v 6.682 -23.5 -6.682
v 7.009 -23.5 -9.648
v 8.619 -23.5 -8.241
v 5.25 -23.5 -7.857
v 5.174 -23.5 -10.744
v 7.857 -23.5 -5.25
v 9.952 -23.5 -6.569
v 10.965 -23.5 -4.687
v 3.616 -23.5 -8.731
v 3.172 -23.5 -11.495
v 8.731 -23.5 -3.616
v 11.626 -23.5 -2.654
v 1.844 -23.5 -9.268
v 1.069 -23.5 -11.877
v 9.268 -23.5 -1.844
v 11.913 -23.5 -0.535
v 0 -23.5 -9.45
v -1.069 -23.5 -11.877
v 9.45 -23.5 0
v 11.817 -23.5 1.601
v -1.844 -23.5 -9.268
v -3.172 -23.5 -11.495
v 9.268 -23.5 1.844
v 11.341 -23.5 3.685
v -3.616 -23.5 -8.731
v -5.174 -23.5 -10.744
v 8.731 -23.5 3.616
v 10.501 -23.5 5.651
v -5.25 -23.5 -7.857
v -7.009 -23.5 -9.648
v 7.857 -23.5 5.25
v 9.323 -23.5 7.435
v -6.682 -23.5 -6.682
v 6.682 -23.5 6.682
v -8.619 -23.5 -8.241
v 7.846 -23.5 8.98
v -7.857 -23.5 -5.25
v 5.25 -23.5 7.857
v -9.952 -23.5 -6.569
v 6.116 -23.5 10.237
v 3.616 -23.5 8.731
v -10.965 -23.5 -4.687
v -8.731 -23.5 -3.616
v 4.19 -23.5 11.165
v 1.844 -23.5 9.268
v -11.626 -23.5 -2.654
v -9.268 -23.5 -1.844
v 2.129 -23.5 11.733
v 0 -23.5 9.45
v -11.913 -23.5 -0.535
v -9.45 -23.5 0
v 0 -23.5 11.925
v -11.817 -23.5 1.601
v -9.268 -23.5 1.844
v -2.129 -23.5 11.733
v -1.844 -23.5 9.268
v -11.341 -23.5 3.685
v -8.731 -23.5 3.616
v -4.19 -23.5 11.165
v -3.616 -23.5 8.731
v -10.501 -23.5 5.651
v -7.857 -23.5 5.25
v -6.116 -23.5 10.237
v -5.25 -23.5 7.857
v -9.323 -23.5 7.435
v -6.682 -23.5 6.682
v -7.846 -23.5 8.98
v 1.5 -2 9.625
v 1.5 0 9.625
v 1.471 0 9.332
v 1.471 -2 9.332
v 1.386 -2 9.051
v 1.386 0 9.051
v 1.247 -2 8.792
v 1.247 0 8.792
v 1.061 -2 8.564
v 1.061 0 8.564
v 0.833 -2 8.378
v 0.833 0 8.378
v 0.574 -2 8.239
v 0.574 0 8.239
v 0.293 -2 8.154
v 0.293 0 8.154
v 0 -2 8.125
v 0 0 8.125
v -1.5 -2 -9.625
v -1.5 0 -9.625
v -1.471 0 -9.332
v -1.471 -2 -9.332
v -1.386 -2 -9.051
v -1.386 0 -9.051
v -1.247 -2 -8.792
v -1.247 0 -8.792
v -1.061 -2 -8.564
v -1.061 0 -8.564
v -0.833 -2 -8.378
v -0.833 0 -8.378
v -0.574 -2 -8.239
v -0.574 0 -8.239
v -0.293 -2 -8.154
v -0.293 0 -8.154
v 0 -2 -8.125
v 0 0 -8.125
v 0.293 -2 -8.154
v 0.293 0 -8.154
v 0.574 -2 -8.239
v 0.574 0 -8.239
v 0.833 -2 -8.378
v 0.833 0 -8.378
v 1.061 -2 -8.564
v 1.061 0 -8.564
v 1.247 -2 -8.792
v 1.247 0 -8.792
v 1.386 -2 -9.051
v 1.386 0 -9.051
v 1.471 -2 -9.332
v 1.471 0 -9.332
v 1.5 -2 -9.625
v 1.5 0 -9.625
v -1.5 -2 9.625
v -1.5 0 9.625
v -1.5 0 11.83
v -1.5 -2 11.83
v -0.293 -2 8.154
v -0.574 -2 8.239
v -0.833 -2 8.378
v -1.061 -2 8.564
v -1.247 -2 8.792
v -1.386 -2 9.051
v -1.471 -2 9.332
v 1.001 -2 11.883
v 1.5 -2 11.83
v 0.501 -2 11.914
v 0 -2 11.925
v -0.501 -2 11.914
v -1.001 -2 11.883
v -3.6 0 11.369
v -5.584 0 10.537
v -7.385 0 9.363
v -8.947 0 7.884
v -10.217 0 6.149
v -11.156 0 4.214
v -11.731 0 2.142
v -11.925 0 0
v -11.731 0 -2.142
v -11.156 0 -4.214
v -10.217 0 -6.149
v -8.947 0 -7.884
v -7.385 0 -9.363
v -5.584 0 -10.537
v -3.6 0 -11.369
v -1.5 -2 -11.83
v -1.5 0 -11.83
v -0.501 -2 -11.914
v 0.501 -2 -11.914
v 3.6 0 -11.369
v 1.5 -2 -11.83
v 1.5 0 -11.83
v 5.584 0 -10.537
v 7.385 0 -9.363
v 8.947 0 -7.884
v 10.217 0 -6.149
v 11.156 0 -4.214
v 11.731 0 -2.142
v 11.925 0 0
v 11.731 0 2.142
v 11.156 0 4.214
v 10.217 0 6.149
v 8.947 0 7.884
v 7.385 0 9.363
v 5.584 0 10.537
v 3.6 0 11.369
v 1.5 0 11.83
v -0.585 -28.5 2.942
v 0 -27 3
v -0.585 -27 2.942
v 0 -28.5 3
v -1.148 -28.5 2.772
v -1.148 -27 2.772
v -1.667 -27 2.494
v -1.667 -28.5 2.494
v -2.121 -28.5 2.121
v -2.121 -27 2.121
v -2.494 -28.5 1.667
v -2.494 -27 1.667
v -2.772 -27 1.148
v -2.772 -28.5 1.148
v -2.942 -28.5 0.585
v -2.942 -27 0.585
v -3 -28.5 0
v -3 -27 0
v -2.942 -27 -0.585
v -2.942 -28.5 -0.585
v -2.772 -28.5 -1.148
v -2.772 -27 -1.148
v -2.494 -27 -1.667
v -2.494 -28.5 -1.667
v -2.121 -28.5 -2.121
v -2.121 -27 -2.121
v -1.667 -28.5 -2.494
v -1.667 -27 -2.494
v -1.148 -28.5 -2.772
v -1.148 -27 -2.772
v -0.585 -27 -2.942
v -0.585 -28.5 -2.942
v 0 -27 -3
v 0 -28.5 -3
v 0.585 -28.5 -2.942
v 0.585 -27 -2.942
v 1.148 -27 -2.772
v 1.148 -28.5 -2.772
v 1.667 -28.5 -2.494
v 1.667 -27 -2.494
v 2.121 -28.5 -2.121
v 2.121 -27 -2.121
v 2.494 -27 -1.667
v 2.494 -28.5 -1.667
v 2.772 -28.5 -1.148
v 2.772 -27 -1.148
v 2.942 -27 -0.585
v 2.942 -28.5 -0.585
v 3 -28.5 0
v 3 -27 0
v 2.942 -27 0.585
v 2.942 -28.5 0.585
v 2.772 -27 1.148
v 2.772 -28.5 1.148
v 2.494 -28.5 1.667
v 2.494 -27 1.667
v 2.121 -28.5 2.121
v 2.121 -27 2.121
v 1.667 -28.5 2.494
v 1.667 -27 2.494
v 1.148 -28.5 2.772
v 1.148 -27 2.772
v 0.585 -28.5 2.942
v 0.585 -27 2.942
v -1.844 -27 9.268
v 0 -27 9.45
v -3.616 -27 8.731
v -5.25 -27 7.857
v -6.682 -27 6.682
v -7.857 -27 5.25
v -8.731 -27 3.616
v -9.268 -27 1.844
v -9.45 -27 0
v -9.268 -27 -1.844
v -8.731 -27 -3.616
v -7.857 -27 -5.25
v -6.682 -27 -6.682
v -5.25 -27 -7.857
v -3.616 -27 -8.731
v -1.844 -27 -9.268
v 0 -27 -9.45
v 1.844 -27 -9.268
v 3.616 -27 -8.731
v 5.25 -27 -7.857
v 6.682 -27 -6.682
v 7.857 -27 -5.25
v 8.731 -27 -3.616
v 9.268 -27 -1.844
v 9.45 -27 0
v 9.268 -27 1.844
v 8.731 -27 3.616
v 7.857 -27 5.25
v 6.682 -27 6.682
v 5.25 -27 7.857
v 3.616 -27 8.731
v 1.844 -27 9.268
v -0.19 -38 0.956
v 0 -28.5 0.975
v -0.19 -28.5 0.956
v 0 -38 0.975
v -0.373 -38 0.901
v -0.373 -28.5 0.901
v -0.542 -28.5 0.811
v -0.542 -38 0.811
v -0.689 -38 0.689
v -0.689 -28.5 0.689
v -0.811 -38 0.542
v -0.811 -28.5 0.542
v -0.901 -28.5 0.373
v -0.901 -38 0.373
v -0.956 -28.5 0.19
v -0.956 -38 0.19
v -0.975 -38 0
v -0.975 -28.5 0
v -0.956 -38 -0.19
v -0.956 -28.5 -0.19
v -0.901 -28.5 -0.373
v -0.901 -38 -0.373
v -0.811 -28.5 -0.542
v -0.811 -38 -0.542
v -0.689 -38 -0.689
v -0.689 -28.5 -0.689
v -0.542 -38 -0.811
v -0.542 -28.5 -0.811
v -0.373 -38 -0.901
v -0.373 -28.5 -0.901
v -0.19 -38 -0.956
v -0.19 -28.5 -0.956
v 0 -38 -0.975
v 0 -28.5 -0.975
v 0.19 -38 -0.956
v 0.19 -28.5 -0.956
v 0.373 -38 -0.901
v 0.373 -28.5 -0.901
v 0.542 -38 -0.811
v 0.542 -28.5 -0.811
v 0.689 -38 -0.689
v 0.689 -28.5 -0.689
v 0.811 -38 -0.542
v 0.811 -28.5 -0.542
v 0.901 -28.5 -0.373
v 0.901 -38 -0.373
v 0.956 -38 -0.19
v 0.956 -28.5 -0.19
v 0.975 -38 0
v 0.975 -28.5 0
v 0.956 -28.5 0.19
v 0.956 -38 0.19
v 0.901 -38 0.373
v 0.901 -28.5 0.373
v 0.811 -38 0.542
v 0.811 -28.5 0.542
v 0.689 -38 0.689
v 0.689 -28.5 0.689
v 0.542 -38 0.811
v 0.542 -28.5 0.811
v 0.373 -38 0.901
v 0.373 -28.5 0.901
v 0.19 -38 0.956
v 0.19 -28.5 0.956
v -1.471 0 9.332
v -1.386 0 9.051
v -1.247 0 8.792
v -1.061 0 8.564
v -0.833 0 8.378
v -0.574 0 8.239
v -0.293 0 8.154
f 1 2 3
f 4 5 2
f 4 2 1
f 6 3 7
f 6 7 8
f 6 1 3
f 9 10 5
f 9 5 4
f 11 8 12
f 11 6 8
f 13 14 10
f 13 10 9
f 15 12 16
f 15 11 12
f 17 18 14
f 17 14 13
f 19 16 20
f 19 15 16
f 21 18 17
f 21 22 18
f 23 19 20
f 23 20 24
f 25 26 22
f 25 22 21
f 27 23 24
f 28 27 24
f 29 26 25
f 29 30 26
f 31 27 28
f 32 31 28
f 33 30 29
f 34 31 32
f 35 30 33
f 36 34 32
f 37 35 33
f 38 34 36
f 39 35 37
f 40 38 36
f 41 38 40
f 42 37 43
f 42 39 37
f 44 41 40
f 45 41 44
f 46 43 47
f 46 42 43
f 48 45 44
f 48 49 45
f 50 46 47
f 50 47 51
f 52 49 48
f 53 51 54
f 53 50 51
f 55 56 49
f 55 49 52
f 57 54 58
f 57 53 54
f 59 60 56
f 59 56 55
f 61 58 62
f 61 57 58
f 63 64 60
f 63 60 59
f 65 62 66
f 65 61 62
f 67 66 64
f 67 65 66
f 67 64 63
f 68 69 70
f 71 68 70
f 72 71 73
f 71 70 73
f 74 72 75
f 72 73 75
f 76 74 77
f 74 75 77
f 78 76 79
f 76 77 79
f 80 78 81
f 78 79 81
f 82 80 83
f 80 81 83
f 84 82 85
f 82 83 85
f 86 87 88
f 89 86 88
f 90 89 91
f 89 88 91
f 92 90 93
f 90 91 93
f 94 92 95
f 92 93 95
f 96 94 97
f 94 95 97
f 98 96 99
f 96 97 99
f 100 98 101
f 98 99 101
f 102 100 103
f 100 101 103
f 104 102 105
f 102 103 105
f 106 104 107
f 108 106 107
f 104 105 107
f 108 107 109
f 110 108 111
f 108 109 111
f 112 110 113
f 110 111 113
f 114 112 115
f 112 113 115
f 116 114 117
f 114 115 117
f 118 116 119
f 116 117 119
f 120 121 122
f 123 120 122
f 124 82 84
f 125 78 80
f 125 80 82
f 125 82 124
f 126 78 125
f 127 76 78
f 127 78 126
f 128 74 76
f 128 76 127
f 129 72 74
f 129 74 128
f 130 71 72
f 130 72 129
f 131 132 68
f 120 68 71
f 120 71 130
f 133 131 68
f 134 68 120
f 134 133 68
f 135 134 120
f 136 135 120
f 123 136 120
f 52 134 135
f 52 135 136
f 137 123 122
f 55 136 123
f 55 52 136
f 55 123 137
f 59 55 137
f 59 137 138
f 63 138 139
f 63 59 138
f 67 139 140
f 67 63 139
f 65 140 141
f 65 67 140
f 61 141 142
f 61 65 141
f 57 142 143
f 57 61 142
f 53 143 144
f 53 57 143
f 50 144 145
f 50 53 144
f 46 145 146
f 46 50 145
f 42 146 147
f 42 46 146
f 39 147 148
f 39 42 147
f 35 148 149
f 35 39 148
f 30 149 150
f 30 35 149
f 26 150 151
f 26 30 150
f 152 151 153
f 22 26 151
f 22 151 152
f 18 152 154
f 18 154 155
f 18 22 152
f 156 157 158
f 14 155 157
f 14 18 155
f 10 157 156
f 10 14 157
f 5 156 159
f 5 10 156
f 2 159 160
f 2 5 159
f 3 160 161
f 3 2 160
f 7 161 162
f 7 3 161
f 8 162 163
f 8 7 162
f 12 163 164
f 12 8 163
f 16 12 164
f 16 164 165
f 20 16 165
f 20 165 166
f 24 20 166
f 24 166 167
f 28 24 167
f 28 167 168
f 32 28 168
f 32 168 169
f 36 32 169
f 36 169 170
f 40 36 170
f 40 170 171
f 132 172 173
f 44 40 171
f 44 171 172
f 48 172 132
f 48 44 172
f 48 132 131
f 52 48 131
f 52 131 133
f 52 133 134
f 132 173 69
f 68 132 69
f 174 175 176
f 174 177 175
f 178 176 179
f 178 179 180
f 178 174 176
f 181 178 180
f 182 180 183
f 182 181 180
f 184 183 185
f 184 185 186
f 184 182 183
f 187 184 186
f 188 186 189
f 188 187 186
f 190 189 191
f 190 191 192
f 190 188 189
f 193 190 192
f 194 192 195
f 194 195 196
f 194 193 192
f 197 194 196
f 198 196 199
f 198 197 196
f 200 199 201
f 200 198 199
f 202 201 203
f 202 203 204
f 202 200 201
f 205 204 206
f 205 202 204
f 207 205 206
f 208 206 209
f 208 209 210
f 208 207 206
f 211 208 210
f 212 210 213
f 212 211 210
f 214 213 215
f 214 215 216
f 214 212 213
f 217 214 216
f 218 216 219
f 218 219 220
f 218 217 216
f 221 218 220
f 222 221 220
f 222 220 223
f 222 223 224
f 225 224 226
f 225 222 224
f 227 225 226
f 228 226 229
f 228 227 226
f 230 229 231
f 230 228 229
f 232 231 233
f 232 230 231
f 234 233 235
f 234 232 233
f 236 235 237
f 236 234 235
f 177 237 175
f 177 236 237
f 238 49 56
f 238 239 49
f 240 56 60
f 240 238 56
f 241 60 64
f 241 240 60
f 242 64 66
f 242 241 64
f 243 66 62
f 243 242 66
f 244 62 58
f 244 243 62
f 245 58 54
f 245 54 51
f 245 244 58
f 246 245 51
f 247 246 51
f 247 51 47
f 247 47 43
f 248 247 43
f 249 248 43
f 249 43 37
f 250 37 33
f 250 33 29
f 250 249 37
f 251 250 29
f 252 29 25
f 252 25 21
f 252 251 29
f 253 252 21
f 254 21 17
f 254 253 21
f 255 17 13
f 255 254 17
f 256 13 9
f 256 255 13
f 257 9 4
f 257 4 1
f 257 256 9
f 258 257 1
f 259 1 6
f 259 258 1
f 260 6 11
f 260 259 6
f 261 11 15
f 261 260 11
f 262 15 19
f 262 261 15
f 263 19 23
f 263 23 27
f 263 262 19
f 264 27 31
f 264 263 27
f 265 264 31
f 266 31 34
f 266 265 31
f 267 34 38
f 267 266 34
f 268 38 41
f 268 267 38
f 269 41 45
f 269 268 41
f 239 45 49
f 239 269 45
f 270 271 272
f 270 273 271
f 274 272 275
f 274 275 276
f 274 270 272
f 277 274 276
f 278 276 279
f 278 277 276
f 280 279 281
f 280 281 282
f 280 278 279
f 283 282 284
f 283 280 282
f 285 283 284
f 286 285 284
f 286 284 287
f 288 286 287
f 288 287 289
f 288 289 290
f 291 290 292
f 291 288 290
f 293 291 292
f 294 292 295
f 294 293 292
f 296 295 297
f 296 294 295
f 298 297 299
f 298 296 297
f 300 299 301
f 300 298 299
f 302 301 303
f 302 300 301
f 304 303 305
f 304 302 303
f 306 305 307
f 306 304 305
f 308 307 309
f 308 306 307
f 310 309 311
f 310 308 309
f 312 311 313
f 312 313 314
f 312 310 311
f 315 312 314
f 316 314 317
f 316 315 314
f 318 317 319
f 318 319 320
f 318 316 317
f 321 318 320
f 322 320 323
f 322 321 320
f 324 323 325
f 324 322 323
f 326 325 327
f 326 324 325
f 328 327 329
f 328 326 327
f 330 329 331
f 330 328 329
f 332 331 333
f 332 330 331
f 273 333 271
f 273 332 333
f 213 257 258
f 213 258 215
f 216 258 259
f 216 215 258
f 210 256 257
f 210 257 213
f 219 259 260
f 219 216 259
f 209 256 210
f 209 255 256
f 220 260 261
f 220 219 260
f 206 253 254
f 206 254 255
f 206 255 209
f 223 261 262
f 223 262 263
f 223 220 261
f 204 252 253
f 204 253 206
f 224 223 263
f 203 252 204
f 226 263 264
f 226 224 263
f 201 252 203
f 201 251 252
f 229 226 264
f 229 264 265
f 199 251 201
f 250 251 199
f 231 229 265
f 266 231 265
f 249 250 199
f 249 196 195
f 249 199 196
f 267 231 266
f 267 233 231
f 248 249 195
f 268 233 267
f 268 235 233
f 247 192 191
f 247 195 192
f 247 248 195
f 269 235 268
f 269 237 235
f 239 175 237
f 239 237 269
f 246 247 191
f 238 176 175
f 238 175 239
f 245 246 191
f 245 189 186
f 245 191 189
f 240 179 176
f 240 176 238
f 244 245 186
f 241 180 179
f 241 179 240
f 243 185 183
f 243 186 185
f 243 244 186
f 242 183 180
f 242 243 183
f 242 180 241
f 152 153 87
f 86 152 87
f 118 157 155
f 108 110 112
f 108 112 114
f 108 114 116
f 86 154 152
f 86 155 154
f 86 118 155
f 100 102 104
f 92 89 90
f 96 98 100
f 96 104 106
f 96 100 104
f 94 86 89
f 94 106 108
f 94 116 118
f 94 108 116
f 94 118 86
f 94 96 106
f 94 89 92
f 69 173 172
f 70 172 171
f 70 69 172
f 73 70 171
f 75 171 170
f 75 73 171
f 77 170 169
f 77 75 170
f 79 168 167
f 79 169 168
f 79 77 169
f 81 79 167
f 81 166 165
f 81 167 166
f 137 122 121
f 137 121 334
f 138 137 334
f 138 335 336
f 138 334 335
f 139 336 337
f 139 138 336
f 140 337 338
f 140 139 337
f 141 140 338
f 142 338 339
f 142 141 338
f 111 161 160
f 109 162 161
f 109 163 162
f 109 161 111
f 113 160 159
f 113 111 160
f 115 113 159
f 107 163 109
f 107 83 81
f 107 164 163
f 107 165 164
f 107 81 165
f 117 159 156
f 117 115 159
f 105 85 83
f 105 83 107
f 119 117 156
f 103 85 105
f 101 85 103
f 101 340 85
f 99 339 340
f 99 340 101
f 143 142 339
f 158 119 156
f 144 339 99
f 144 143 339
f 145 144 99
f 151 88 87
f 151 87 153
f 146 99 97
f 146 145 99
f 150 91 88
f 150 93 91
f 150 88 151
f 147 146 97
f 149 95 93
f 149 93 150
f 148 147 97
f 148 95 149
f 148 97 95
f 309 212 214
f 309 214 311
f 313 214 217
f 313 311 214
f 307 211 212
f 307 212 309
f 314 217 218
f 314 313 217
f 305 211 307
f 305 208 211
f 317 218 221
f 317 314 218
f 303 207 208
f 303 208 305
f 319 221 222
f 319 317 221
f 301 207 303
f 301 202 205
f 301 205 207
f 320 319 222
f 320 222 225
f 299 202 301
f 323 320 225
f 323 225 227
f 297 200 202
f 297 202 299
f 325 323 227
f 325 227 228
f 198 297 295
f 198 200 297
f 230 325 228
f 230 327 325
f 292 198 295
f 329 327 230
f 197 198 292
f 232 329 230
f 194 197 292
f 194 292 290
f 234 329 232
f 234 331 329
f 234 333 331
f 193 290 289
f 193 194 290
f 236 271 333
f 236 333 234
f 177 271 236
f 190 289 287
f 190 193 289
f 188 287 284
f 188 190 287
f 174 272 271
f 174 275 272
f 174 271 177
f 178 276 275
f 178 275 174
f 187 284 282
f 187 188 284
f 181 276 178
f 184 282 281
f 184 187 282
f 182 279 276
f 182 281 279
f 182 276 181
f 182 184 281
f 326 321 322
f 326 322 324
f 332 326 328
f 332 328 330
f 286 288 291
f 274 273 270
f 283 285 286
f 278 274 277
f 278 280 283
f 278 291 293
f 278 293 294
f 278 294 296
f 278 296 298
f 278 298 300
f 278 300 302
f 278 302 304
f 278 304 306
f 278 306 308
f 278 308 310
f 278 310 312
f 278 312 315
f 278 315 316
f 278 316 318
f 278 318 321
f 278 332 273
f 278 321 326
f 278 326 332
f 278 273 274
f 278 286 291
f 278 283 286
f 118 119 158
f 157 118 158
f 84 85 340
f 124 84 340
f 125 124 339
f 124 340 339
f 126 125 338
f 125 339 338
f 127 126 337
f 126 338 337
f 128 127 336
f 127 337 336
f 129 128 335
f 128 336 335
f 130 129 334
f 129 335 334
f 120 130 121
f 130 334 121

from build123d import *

# Parameters (mm, degrees)
F3_DEPTH = 2


with BuildPart() as f1:
    # F0 (on Right) → F1 (revolve)
    with BuildSketch(Plane.YZ):
        Polygon((-38, 0), (0, 0), (0, 11.925), (-23.5, 11.925), (-23.5, 9.45), (-27, 9.45), (-27, 3), (-28.5, 3), (-28.5, 0.975), (-38, 0.975), align=None)
    revolve(axis=Axis((0, -23.908602, 0), (0, -1, 0)))

    # F2 (on face) → F3 (cut)
    with BuildSketch(Plane(origin=(0, 0, 0), x_dir=(-1, 0, 0), z_dir=(0, 1, 0))):
        with BuildLine():
            Line((1.5, 11.925), (-1.5, 11.925))
            Line((-1.5, 11.925), (-1.5, 9.625))
            ThreePointArc((-1.5, 9.625), (-1.06066, 8.56434), (0, 8.125))
            ThreePointArc((0, 8.125), (1.06066, 8.56434), (1.5, 9.625))
            Line((1.5, 9.625), (1.5, 11.925))
        make_face()
        with BuildLine():
            Line((1.5, -11.925), (1.5, -9.625))
            ThreePointArc((1.5, -9.625), (0, -8.125), (-1.5, -9.625))
            Line((-1.5, -9.625), (-1.5, -11.925))
            Line((-1.5, -11.925), (1.5, -11.925))
        make_face()
    extrude(amount=-F3_DEPTH, mode=Mode.SUBTRACT)


solid = f1.part
